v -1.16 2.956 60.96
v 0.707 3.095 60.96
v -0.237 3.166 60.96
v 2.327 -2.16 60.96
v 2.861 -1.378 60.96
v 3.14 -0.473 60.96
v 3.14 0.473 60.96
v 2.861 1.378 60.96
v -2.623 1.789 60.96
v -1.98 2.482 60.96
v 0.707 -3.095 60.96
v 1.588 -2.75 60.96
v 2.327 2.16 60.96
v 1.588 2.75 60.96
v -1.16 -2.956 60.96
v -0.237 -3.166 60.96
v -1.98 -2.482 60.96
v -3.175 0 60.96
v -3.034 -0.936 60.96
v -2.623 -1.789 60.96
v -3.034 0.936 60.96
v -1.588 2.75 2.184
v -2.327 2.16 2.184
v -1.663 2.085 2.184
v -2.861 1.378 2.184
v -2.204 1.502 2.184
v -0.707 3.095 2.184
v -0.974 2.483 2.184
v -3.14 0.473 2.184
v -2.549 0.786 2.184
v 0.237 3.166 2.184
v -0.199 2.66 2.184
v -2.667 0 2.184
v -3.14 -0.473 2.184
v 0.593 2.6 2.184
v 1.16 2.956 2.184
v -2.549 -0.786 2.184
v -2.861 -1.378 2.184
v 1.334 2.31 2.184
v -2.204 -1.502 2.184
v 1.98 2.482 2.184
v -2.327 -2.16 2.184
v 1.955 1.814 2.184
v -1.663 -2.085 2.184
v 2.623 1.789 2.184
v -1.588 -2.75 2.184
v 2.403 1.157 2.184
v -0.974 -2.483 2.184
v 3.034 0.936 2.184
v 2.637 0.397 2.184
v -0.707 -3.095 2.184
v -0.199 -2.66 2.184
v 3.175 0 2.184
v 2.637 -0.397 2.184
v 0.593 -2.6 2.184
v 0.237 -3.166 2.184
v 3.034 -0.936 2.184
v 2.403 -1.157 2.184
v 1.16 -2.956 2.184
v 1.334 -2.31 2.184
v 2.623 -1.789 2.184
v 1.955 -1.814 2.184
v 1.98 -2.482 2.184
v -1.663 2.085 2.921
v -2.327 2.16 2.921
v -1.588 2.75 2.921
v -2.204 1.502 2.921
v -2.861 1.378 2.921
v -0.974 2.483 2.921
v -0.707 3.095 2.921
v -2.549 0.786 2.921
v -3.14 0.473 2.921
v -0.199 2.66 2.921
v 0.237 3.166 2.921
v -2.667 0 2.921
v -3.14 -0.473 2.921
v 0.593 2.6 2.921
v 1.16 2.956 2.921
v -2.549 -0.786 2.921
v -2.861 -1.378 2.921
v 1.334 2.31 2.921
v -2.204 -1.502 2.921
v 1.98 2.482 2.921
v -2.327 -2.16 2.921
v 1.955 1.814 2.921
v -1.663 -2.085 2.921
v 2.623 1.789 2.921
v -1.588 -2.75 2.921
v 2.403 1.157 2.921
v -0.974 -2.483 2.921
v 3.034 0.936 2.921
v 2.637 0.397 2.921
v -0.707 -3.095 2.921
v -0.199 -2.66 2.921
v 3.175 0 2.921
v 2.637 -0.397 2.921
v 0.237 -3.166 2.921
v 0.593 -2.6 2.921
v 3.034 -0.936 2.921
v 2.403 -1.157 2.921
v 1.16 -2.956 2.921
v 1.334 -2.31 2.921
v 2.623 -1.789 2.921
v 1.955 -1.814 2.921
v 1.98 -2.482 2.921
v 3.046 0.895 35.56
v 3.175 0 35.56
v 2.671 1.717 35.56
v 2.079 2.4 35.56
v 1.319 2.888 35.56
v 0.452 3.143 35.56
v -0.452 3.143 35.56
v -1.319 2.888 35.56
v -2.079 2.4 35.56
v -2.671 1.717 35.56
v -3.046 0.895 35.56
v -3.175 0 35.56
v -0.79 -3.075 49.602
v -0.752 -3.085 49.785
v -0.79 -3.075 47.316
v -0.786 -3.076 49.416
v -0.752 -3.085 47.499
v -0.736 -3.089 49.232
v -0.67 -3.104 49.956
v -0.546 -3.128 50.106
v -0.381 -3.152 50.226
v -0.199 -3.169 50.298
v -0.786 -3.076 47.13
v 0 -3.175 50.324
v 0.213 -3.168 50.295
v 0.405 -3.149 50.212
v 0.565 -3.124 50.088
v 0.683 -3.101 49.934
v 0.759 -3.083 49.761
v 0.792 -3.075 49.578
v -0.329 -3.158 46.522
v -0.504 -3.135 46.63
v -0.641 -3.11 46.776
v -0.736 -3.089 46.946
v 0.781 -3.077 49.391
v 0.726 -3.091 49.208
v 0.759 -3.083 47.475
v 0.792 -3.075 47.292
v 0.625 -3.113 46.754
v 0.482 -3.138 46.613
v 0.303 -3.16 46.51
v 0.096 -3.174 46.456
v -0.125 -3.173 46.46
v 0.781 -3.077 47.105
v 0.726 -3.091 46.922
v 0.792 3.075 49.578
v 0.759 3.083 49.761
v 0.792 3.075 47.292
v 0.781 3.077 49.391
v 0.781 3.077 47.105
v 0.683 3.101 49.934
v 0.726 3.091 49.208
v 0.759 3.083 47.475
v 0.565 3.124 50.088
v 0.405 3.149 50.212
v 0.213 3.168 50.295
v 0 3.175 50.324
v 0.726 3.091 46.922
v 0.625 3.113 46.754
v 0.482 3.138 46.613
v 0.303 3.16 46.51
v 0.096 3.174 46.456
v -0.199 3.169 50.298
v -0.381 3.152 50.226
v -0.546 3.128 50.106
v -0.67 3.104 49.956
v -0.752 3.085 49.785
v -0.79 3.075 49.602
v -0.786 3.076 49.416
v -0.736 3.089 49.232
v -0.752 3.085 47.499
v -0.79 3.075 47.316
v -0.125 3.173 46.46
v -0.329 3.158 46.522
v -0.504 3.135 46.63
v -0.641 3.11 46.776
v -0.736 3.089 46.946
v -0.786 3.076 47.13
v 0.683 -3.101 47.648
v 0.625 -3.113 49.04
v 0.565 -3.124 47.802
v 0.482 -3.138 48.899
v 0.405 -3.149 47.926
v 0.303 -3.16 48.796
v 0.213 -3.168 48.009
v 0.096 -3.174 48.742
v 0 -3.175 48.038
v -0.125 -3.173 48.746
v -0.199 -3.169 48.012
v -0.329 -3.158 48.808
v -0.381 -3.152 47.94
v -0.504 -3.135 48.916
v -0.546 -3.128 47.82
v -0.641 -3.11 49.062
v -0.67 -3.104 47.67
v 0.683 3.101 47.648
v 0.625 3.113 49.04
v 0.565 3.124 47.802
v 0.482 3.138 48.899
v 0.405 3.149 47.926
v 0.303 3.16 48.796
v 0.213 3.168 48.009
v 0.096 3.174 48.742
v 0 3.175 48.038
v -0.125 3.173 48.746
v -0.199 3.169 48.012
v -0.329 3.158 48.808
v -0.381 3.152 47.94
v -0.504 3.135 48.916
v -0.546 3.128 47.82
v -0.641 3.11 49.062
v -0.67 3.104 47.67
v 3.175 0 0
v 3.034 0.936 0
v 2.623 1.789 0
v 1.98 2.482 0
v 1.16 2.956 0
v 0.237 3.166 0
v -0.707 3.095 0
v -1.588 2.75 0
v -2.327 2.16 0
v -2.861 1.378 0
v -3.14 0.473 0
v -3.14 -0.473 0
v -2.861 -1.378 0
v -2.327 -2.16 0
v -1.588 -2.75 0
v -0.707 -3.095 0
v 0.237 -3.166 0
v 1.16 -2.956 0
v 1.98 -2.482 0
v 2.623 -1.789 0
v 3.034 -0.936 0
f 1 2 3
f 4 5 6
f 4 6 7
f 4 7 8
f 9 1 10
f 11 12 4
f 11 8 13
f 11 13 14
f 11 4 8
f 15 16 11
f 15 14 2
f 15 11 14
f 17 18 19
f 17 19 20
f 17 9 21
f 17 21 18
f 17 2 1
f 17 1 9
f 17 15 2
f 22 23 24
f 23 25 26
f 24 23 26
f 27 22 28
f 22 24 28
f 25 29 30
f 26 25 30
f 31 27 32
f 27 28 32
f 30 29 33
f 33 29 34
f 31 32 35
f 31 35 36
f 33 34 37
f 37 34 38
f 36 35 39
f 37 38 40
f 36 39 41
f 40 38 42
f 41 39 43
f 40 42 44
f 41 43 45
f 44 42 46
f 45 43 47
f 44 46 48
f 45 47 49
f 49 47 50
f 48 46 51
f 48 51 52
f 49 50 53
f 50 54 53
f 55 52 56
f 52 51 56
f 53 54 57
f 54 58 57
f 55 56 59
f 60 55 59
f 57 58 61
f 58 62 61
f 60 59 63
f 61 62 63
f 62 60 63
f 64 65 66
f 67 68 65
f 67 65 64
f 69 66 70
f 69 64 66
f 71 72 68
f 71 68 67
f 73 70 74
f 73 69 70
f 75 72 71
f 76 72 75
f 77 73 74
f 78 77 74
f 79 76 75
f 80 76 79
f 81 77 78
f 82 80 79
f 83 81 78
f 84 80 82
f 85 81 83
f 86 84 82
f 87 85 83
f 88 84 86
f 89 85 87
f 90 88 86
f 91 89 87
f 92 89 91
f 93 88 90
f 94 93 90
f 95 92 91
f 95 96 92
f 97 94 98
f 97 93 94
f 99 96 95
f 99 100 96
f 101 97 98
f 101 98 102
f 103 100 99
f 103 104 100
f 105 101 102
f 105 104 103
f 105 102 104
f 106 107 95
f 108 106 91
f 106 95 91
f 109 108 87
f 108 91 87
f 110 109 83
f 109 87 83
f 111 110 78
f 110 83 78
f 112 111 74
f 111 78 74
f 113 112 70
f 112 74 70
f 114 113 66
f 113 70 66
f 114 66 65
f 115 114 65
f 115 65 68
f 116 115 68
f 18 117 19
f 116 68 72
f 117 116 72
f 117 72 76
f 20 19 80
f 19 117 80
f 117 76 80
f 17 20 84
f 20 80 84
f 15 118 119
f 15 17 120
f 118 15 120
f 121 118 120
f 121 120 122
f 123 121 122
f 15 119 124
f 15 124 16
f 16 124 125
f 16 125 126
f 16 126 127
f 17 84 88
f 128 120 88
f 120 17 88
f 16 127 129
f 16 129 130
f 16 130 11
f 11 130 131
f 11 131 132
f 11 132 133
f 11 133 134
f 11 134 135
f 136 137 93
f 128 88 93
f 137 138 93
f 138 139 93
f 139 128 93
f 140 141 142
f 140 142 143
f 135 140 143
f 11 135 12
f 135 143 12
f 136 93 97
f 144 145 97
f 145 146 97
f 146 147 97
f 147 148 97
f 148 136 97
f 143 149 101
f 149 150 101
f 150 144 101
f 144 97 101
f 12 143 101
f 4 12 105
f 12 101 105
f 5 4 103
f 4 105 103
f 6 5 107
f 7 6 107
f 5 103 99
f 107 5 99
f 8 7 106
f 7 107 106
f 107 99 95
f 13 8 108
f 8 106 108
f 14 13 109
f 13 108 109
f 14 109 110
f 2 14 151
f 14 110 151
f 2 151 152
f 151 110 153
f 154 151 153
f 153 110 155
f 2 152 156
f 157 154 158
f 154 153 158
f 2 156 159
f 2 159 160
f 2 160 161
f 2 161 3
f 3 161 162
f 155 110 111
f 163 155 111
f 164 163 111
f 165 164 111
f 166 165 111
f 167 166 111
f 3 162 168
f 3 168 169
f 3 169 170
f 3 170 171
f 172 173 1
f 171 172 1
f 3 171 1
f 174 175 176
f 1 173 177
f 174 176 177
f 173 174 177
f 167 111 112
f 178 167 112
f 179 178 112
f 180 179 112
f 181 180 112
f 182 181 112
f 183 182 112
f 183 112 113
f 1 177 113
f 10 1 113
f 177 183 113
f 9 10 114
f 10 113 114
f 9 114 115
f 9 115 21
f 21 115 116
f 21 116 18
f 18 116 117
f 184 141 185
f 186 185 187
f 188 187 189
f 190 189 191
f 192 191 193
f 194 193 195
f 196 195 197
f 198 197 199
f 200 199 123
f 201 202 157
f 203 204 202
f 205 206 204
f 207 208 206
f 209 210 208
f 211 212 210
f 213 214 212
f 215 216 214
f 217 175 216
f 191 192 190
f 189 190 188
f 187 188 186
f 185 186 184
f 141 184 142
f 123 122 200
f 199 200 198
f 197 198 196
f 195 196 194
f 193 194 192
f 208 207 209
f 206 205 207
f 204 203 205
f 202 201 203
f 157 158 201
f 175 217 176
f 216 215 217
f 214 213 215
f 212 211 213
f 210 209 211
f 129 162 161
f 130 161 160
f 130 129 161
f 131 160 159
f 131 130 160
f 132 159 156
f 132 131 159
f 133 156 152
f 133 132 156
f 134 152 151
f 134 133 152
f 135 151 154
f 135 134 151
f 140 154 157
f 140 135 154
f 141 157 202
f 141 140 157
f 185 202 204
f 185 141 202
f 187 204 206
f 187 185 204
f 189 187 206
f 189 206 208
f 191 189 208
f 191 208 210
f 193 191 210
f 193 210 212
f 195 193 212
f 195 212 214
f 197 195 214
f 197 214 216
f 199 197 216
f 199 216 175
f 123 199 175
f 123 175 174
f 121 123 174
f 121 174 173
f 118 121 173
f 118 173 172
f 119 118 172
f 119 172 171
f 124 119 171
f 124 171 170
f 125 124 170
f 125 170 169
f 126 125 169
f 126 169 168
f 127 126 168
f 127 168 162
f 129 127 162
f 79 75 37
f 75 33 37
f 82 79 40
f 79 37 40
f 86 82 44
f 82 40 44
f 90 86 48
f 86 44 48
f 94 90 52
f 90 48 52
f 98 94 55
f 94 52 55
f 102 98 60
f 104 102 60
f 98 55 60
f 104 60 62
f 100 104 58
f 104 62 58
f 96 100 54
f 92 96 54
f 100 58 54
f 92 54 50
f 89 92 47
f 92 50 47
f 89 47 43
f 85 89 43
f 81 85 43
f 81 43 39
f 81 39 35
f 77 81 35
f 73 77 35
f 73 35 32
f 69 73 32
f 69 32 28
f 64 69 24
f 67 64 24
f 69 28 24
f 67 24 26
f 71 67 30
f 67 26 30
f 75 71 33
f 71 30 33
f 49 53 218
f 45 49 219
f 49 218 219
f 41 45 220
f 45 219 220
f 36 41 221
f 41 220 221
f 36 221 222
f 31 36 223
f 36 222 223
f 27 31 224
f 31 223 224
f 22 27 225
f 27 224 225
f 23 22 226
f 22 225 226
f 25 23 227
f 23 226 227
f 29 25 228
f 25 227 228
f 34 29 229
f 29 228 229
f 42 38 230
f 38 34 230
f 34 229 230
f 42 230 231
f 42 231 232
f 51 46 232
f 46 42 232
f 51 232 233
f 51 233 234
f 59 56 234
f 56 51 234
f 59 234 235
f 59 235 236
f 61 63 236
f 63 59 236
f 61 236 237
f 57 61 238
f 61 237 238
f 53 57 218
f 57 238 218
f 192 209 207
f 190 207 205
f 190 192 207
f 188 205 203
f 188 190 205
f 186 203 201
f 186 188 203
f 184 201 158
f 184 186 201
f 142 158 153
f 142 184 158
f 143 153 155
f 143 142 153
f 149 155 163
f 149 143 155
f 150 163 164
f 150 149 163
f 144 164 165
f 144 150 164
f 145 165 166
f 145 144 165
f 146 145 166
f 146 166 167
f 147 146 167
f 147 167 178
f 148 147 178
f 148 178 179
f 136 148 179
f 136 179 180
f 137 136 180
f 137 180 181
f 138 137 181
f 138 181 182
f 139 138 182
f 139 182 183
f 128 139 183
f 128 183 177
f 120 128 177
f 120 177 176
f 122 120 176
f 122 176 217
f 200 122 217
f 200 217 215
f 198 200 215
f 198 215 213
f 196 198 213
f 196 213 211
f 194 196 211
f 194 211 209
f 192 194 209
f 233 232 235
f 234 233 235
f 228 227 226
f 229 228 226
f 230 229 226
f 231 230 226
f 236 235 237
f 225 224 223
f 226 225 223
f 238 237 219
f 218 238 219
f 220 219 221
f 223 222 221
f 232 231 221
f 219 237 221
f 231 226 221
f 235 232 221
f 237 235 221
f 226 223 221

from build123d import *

# Parameters (mm, degrees)
SKETCH1_R               = 3.175
BOSS_EXTRUDE1_DEPTH     = 35.56
SKETCH3_W               = 0.508
SKETCH3_H               = 0.7366
SKETCH5_R               = 3.175
BOSS_EXTRUDE2_DEPTH     = 25.4
CUT_EXTRUDE1_DEPTH      = 62.1251409
CUT_EXTRUDE1_DEPTH_BACK = 62.1251409
SKETCH4_R               = 0.79375


with BuildPart() as part:
    # Sketch1 → Boss-Extrude1 (new body)
    with BuildSketch(Plane.XY):
        Circle(SKETCH1_R)
    extrude(amount=BOSS_EXTRUDE1_DEPTH)

    # Sketch3 → Cut-Revolve3 (revolve, cut)
    with BuildSketch(Plane(origin=(0, 0, 0), x_dir=(1, 0, 0), z_dir=(0, 1, 0)), mode=Mode.PRIVATE) as cut_revolve3_sk:
        with Locations((2.921, -2.5527)):
            Rectangle(SKETCH3_W, SKETCH3_H)
    revolve(cut_revolve3_sk.sketch.rotate(Axis((0, 0, 0), (0, 0, 1)), 180), axis=Axis((0, 0, 0), (0, 0, 1)), mode=Mode.SUBTRACT)

    # Sketch5 → Boss-Extrude2 (add)
    with BuildSketch(Plane.XY.offset(35.56)):
        with Locations(Location((0, 0, 0), (0, 0, 180))):
            Circle(SKETCH5_R)
    extrude(amount=BOSS_EXTRUDE2_DEPTH)

    # Sketch4 → Cut-Extrude1 (cut, two sides: drawn at the far end of the back side and taken through both)
    with BuildSketch(Plane(origin=(0, 0, 0), x_dir=(1, 0, 0), z_dir=(0, 1, 0)).offset(-CUT_EXTRUDE1_DEPTH_BACK)):
        with Locations(Location((0, -47.244, 0), (0, 0, 270))):
            Circle(SKETCH4_R)
        with Locations(Location((0, -49.53, 0), (0, 0, 270))):
            Circle(SKETCH4_R)
    extrude(amount=CUT_EXTRUDE1_DEPTH + CUT_EXTRUDE1_DEPTH_BACK, mode=Mode.SUBTRACT)


solid = part.part
